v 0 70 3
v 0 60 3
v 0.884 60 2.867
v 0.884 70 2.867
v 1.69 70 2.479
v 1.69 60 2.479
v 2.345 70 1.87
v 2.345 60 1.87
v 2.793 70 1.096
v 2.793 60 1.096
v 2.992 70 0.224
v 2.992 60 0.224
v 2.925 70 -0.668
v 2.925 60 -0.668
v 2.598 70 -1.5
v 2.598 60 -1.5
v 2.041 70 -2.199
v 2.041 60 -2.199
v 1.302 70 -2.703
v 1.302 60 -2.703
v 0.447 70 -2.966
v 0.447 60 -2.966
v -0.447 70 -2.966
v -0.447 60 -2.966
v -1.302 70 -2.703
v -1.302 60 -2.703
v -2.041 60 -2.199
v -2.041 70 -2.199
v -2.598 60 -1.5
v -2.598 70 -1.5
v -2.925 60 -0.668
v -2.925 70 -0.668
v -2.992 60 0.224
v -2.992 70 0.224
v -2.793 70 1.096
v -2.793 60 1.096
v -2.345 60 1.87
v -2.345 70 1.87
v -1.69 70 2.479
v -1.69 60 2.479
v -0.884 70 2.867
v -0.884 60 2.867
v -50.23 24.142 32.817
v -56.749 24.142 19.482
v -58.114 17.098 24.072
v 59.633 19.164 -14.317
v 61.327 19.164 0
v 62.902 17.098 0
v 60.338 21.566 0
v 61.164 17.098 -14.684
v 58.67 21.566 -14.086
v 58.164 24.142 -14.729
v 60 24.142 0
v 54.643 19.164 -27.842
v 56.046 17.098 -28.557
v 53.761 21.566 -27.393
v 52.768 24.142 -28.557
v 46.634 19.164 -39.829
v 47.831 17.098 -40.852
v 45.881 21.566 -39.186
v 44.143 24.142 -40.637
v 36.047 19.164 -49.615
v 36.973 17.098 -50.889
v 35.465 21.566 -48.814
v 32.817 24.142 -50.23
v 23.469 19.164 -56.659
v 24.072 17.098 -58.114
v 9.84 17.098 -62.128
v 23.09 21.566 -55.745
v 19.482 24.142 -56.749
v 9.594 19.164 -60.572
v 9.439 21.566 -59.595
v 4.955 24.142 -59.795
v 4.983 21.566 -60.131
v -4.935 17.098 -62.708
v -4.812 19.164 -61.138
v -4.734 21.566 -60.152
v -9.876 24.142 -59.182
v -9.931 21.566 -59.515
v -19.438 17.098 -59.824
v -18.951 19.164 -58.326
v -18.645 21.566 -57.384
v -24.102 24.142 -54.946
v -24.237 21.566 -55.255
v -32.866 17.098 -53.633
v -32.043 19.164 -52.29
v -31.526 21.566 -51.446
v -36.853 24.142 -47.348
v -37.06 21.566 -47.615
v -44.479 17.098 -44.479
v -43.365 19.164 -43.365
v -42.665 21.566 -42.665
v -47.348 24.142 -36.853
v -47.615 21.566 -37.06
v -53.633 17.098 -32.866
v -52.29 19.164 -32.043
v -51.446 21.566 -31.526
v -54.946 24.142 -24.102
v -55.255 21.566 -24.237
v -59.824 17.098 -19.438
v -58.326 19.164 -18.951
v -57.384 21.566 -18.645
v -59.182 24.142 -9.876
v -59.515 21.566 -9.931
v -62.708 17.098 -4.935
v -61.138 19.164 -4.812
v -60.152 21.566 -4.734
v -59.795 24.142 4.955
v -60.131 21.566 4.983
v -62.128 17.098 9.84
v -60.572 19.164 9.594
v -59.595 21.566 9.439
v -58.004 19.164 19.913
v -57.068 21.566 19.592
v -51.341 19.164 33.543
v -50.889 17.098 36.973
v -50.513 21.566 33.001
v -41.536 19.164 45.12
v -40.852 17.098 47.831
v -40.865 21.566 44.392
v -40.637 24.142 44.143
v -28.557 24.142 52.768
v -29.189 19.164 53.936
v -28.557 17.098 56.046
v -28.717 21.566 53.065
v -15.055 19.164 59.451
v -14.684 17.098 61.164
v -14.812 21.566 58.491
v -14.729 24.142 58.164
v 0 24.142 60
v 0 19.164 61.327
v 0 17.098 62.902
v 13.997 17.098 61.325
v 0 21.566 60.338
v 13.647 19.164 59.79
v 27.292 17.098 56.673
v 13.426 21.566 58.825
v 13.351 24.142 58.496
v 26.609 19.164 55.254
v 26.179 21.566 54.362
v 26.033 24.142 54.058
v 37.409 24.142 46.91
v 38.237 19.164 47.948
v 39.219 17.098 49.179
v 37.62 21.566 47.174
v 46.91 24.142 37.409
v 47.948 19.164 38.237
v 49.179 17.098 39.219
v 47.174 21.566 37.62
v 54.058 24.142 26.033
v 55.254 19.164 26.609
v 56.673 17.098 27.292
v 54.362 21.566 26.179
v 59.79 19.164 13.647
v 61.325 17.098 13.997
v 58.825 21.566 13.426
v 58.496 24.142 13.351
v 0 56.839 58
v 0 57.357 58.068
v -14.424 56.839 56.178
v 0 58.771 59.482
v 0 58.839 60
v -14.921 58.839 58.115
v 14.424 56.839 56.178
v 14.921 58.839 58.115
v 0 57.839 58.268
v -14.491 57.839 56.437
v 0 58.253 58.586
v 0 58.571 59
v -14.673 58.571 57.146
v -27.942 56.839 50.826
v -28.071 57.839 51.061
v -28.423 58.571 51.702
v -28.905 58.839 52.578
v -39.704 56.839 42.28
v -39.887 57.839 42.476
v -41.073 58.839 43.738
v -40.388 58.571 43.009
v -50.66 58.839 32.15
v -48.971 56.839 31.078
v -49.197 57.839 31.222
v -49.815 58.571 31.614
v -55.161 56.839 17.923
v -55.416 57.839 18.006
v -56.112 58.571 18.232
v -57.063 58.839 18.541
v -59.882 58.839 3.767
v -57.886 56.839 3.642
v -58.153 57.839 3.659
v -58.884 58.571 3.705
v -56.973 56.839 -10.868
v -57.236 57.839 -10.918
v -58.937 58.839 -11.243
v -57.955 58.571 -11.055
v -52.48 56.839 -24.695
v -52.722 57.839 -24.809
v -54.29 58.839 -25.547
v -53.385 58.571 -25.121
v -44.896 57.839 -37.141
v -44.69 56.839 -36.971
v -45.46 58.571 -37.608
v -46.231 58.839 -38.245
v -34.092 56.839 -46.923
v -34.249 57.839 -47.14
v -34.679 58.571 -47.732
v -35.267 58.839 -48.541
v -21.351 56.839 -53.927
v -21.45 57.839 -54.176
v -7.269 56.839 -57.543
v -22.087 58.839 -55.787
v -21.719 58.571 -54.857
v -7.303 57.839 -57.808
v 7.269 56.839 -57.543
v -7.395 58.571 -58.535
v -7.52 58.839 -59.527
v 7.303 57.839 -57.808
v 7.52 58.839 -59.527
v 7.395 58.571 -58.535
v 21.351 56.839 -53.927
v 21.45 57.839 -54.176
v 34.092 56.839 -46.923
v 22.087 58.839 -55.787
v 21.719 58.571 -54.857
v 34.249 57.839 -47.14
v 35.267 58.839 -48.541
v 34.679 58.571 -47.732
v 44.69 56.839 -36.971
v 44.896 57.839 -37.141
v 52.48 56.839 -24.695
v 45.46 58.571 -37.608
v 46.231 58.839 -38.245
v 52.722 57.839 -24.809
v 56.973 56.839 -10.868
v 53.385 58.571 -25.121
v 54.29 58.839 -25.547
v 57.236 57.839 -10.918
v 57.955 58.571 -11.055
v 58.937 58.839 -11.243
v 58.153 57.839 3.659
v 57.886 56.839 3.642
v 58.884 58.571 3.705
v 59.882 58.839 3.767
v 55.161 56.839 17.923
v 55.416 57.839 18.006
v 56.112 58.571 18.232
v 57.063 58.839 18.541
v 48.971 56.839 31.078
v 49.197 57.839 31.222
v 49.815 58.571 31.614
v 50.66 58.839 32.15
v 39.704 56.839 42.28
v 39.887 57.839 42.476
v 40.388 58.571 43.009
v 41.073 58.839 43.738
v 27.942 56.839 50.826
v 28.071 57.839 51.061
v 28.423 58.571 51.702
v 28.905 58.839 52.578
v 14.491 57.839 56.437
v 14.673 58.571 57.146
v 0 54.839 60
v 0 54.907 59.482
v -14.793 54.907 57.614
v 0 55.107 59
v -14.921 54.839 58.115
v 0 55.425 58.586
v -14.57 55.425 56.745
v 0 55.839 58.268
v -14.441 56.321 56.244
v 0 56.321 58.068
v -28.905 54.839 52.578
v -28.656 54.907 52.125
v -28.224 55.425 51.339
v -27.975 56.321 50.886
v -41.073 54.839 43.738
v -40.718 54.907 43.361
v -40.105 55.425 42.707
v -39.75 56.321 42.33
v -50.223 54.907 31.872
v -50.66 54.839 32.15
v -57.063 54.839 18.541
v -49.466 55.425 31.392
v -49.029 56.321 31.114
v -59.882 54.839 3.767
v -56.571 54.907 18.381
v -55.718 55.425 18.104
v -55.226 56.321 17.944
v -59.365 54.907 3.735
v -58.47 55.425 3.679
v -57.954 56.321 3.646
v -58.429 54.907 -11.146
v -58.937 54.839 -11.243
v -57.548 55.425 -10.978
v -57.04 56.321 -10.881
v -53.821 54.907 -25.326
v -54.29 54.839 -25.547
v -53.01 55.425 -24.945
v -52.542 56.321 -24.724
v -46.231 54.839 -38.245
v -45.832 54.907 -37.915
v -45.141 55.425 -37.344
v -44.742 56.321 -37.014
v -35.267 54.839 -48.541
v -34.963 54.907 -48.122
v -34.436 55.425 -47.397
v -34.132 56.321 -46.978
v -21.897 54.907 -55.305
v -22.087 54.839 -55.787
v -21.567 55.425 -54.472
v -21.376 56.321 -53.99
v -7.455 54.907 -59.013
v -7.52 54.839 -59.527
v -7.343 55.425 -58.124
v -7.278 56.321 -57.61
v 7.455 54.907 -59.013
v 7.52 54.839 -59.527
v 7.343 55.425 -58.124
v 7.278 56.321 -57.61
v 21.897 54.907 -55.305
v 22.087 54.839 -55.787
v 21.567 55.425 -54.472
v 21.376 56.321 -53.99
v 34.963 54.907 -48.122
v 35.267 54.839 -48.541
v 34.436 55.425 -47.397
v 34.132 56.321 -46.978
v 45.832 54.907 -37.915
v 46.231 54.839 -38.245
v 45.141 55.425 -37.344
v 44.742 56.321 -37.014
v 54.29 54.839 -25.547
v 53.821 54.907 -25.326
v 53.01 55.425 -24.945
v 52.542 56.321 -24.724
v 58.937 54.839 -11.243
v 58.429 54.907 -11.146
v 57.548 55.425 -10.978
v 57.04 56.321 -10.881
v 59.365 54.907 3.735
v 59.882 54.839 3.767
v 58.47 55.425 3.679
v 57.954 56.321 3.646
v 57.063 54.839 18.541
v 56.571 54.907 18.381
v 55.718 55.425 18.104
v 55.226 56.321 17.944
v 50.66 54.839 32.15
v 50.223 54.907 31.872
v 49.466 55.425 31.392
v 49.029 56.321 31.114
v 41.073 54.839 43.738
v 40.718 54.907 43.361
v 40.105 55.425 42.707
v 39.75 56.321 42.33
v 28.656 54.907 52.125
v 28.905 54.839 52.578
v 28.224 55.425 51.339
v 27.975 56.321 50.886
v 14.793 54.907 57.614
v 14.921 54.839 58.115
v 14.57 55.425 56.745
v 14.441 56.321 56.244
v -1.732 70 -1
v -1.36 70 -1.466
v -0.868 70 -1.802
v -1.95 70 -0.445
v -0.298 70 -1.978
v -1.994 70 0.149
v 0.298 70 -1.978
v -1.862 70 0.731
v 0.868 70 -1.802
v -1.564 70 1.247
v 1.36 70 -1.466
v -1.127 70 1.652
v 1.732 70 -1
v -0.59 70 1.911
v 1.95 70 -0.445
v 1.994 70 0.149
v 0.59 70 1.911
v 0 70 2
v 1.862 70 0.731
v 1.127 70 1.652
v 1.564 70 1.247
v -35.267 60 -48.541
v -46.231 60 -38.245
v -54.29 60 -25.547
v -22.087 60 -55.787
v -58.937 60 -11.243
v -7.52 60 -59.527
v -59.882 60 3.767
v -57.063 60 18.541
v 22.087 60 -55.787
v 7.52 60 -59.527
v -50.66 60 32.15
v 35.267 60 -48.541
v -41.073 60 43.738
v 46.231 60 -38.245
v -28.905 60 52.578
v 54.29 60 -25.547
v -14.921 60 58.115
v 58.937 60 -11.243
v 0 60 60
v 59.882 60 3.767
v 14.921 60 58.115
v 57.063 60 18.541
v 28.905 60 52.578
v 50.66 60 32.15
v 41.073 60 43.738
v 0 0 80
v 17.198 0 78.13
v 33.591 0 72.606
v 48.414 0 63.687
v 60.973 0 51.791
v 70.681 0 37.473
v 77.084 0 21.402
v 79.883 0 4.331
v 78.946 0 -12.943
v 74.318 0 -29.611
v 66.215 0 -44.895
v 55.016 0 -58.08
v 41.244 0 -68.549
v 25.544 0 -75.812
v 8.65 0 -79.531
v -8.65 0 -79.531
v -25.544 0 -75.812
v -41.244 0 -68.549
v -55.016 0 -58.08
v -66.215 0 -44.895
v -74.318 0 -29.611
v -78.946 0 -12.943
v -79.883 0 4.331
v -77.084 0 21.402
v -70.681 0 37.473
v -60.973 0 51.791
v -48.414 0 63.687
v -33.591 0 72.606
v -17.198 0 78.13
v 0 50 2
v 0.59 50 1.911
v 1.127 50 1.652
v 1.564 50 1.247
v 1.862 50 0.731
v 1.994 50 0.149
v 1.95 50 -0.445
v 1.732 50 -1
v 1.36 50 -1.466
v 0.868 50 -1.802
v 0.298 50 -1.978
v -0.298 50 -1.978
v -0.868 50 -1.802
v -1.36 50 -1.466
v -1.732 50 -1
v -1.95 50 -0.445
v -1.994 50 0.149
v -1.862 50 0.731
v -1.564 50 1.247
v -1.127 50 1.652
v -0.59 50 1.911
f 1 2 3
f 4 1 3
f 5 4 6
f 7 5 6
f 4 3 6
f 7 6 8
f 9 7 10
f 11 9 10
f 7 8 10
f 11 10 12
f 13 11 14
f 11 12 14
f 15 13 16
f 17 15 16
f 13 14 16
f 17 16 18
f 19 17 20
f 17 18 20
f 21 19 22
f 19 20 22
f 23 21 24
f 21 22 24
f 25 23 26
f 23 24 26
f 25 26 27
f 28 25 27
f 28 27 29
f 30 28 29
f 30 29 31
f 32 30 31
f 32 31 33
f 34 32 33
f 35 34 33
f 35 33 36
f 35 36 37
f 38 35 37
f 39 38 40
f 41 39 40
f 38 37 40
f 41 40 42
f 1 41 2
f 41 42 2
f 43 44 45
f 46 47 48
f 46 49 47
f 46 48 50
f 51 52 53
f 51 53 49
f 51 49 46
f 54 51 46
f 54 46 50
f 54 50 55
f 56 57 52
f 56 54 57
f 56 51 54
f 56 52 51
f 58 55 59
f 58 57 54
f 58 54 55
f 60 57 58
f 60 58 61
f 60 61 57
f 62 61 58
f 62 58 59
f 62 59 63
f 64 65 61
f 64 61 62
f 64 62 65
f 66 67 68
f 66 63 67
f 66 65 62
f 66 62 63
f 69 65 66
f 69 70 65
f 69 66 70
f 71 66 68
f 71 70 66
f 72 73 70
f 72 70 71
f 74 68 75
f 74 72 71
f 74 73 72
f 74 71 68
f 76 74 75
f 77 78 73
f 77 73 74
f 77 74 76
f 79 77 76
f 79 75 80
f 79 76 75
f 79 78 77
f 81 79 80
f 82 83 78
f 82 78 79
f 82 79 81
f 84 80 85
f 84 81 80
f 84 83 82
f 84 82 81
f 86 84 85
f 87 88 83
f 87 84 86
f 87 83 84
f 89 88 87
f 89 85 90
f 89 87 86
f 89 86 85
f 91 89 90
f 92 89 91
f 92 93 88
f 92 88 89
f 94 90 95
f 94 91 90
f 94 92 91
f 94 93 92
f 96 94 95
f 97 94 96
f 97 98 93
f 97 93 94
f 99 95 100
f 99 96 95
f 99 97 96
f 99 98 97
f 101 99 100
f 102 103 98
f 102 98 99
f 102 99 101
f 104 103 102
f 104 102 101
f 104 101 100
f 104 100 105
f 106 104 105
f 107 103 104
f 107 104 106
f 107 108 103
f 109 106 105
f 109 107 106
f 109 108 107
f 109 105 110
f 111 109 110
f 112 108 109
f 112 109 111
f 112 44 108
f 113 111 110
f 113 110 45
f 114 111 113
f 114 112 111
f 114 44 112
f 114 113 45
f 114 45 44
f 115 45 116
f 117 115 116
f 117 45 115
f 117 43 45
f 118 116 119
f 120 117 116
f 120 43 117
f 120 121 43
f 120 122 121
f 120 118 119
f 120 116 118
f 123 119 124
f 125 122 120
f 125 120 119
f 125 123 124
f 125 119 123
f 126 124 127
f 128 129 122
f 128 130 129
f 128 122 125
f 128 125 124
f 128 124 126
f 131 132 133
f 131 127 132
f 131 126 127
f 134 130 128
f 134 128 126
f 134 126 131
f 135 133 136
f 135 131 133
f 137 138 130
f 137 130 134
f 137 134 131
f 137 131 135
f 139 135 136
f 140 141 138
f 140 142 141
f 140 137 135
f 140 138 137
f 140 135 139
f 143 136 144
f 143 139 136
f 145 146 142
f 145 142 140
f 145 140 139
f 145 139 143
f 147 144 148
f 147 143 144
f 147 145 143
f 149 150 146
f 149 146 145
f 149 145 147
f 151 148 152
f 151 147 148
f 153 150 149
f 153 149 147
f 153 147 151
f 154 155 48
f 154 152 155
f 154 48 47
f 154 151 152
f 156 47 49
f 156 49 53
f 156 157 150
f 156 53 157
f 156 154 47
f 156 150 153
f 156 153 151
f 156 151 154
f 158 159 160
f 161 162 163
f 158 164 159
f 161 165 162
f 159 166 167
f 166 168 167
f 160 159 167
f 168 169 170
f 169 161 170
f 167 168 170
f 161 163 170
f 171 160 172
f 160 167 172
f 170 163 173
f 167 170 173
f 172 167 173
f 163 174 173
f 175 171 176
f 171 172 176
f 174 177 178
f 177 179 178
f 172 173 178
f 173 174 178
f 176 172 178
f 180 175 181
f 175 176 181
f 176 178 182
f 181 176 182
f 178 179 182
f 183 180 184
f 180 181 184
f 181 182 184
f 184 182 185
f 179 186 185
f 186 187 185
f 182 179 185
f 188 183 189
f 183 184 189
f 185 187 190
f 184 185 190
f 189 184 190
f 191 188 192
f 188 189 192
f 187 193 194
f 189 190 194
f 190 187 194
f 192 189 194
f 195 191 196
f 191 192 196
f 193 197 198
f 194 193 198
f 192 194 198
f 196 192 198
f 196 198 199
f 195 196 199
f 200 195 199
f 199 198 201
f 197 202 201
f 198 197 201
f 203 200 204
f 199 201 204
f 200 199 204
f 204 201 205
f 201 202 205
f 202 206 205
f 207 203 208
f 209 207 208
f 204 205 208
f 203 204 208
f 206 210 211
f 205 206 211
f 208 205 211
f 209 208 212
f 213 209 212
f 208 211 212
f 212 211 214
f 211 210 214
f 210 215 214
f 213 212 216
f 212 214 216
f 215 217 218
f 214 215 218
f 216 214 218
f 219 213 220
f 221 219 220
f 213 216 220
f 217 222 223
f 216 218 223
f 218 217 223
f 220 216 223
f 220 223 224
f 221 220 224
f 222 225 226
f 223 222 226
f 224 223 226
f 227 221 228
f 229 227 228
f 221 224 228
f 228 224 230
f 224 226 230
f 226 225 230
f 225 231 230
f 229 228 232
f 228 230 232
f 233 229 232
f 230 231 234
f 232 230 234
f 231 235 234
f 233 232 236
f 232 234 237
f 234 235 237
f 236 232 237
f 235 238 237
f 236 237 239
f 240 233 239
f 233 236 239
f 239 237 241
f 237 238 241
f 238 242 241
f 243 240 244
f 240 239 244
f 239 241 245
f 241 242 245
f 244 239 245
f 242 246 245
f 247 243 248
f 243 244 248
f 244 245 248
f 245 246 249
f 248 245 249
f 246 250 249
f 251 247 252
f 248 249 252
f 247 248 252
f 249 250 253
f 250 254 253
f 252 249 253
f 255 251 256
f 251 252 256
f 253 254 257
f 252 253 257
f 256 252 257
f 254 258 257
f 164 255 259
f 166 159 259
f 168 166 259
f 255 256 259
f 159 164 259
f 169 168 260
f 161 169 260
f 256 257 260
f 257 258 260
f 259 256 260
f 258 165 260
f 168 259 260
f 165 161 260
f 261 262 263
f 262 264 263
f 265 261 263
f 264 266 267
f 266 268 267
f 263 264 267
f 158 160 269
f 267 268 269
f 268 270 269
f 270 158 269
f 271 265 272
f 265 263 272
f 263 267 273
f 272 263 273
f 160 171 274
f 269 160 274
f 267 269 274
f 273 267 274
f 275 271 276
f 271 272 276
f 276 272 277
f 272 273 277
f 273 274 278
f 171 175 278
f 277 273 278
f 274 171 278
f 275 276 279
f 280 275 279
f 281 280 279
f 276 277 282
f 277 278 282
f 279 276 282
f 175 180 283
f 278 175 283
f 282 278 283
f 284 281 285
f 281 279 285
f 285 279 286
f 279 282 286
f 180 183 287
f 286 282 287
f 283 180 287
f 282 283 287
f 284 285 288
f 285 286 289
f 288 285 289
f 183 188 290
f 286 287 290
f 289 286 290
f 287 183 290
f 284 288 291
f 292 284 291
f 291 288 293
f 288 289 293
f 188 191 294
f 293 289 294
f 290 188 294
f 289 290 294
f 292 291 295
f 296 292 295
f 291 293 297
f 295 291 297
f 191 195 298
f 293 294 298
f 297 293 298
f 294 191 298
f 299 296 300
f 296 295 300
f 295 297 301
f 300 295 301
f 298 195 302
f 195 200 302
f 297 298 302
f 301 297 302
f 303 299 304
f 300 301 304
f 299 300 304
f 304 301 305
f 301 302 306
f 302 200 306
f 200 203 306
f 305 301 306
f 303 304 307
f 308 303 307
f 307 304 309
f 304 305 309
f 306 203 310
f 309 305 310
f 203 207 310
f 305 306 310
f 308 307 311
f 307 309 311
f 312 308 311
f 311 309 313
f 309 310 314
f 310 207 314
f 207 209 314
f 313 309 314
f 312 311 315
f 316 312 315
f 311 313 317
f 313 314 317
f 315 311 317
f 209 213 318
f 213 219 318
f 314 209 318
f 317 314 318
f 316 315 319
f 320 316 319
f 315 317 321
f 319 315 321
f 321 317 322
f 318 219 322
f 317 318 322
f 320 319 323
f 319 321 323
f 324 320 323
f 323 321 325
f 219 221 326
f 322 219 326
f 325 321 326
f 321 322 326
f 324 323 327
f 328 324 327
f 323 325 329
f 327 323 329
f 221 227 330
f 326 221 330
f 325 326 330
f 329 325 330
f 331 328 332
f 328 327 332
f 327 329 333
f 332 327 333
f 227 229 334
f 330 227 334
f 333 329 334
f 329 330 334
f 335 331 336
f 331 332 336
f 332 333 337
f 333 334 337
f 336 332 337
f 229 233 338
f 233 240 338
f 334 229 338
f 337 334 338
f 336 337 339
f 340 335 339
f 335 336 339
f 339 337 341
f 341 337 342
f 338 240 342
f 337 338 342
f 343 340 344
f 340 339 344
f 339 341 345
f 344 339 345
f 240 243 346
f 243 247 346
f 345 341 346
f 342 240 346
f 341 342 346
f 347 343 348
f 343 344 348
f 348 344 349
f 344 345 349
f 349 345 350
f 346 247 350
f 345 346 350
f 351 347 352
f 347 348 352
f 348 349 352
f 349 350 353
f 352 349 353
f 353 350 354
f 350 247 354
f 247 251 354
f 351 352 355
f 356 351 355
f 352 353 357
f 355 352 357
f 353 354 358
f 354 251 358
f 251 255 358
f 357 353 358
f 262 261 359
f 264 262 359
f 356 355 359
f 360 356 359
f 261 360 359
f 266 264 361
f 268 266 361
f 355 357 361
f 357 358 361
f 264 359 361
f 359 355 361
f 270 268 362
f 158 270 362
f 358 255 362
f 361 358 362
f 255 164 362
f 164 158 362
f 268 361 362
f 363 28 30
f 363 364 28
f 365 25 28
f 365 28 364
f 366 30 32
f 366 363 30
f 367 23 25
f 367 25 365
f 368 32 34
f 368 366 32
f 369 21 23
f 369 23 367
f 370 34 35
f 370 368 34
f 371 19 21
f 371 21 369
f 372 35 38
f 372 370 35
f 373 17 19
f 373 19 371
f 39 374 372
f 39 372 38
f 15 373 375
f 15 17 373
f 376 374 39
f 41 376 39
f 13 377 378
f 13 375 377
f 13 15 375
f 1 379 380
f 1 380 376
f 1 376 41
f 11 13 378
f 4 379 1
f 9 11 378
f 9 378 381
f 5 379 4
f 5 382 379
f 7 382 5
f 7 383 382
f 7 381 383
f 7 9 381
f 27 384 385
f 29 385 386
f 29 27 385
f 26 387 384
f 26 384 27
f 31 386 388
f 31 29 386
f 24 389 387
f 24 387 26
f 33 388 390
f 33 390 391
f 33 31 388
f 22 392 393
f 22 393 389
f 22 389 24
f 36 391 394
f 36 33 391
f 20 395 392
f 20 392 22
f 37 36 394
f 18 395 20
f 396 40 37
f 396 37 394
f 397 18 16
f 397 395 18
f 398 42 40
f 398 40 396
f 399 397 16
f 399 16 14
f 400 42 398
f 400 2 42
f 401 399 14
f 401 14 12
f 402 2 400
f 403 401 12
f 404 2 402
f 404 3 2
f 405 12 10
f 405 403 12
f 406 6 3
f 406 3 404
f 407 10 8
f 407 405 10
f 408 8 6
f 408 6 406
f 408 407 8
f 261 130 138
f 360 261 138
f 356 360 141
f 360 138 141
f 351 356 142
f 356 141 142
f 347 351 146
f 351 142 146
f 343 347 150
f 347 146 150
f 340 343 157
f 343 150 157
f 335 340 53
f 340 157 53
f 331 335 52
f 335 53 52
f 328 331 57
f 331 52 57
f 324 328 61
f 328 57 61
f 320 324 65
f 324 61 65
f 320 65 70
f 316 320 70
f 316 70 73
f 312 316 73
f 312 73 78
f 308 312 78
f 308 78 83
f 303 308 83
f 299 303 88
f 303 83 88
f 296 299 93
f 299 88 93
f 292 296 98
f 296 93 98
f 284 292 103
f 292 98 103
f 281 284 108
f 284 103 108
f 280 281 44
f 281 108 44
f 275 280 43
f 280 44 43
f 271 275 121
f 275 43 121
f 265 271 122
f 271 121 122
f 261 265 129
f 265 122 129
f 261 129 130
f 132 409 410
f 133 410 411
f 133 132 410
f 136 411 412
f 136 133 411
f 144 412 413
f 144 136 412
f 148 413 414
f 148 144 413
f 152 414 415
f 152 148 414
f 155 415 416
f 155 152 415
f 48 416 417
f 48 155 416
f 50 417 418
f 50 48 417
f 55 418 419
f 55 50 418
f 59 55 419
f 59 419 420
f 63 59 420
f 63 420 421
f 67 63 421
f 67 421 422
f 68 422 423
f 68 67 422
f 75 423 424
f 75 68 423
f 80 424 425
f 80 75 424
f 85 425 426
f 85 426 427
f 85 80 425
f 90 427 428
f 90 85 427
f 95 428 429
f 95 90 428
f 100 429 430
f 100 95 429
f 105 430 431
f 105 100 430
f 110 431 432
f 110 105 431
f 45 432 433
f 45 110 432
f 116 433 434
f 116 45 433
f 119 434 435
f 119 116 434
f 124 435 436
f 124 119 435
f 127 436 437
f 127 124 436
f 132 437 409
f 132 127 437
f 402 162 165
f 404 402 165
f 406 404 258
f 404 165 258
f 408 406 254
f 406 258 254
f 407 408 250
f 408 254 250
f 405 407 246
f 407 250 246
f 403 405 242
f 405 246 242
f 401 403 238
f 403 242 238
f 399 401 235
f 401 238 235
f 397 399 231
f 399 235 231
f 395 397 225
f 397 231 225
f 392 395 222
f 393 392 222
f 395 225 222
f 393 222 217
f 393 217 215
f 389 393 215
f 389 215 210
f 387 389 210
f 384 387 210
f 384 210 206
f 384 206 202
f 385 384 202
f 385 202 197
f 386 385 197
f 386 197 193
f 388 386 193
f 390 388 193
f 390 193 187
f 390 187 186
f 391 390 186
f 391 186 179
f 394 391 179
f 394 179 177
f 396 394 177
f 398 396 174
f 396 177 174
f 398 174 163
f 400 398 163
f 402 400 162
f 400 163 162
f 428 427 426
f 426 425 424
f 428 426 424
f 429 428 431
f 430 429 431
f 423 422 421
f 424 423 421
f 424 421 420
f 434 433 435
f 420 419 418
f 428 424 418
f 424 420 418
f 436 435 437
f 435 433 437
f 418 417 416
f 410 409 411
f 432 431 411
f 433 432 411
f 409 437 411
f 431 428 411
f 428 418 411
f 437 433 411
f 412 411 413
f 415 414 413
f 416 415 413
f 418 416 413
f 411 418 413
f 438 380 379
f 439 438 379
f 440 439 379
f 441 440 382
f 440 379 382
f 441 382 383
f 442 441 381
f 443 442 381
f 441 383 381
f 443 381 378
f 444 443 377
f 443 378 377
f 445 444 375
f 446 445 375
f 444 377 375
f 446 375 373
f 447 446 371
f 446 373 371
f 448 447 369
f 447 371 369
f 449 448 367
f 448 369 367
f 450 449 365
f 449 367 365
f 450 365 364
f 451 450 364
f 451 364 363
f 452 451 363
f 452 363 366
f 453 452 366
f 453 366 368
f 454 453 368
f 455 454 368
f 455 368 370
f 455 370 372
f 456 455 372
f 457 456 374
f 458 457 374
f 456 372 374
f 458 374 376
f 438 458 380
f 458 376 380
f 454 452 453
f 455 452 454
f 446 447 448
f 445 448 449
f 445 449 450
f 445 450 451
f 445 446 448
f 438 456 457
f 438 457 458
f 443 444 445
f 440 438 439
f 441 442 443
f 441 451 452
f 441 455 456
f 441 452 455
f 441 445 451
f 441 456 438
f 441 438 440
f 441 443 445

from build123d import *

# Parameters (mm, degrees)
BOSS_EXTRUDE1_DEPTH      = 20
BOSS_EXTRUDE1_DEPTH_BACK = 0.0001
SKETCH1_R                = 80
SKETCH2_R                = 60
BOSS_EXTRUDE2_DEPTH      = 40
SKETCH3_R                = 3
BOSS_EXTRUDE3_DEPTH      = 10
SKETCH4_R                = 2
CUT_EXTRUDE1_DEPTH       = 20
CHAMFER1_SIZE            = 20
SKETCH5_R                = 2


with BuildPart() as part:
    # Sketch1 → Boss-Extrude1 (new, two sides: drawn at the far end of the back side and taken through both)
    with BuildSketch(Plane(origin=(0, 0, 0), x_dir=(1, 0, 0), z_dir=(0, 1, 0)).offset(-BOSS_EXTRUDE1_DEPTH_BACK)):
        with Locations(Location((0, 0, 0), (0, 0, 270))):
            Circle(SKETCH1_R)
    extrude(amount=BOSS_EXTRUDE1_DEPTH + BOSS_EXTRUDE1_DEPTH_BACK)

    # Sketch2 → Boss-Extrude2 (add)
    with BuildSketch(Plane(origin=(0, 20, 0), x_dir=(1, 0, 0), z_dir=(0, 1, 0))):
        with Locations(Location((0, 0, 0), (0, 0, 270))):
            Circle(SKETCH2_R)
    extrude(amount=BOSS_EXTRUDE2_DEPTH)

    # Sketch3 → Boss-Extrude3 (add)
    with BuildSketch(Plane(origin=(0, 60, 0), x_dir=(1, 0, 0), z_dir=(0, 1, 0))):
        with Locations(Location((0, 0, 0), (0, 0, 270))):
            Circle(SKETCH3_R)
    extrude(amount=BOSS_EXTRUDE3_DEPTH)

    # Sketch4 → Cut-Extrude1 (cut)
    with BuildSketch(Plane(origin=(0, 70, 0), x_dir=(1, 0, 0), z_dir=(0, 1, 0))):
        with Locations(Location((0, 0, 0), (0, 0, 270))):
            Circle(SKETCH4_R)
    extrude(amount=-CUT_EXTRUDE1_DEPTH, mode=Mode.SUBTRACT)

    # Chamfer1
    chamfer1_edges = [part.edges().sort_by_distance(p)[0] for p in [
        (0, 20, -80),
    ]]
    chamfer(chamfer1_edges, length=CHAMFER1_SIZE - 0.0001)  # a hair under: the kernel refuses the full size

    # Sketch5 → Cut-Revolve1 (revolve, cut)
    with BuildSketch(Plane(origin=(0, 0, 0), x_dir=(0, 0, -1), z_dir=(1, 0, 0))):
        with Locations((-60, 56.839030786)):
            Circle(SKETCH5_R)
    revolve(axis=Axis((0, 60, 0), (0, -1, 0)), mode=Mode.SUBTRACT)

    # Fillet1: read off the stored shape, not the designer's step
    # Fillet1 outline → Fillet1 (revolve)
    with BuildSketch(Plane.XY):
        with BuildLine():
            ThreePointArc((62.928932188, 17.071067812), (60.761204675, 20.3153013), (60, 24.142135624))
            Line((60, 24.142135624), (60, 17.071067812))
            Line((60, 17.071067812), (62.928932188, 17.071067812))
        make_face()
    revolve(axis=Axis((0, 0, 0), (0, 1, 0)))


solid = part.part
